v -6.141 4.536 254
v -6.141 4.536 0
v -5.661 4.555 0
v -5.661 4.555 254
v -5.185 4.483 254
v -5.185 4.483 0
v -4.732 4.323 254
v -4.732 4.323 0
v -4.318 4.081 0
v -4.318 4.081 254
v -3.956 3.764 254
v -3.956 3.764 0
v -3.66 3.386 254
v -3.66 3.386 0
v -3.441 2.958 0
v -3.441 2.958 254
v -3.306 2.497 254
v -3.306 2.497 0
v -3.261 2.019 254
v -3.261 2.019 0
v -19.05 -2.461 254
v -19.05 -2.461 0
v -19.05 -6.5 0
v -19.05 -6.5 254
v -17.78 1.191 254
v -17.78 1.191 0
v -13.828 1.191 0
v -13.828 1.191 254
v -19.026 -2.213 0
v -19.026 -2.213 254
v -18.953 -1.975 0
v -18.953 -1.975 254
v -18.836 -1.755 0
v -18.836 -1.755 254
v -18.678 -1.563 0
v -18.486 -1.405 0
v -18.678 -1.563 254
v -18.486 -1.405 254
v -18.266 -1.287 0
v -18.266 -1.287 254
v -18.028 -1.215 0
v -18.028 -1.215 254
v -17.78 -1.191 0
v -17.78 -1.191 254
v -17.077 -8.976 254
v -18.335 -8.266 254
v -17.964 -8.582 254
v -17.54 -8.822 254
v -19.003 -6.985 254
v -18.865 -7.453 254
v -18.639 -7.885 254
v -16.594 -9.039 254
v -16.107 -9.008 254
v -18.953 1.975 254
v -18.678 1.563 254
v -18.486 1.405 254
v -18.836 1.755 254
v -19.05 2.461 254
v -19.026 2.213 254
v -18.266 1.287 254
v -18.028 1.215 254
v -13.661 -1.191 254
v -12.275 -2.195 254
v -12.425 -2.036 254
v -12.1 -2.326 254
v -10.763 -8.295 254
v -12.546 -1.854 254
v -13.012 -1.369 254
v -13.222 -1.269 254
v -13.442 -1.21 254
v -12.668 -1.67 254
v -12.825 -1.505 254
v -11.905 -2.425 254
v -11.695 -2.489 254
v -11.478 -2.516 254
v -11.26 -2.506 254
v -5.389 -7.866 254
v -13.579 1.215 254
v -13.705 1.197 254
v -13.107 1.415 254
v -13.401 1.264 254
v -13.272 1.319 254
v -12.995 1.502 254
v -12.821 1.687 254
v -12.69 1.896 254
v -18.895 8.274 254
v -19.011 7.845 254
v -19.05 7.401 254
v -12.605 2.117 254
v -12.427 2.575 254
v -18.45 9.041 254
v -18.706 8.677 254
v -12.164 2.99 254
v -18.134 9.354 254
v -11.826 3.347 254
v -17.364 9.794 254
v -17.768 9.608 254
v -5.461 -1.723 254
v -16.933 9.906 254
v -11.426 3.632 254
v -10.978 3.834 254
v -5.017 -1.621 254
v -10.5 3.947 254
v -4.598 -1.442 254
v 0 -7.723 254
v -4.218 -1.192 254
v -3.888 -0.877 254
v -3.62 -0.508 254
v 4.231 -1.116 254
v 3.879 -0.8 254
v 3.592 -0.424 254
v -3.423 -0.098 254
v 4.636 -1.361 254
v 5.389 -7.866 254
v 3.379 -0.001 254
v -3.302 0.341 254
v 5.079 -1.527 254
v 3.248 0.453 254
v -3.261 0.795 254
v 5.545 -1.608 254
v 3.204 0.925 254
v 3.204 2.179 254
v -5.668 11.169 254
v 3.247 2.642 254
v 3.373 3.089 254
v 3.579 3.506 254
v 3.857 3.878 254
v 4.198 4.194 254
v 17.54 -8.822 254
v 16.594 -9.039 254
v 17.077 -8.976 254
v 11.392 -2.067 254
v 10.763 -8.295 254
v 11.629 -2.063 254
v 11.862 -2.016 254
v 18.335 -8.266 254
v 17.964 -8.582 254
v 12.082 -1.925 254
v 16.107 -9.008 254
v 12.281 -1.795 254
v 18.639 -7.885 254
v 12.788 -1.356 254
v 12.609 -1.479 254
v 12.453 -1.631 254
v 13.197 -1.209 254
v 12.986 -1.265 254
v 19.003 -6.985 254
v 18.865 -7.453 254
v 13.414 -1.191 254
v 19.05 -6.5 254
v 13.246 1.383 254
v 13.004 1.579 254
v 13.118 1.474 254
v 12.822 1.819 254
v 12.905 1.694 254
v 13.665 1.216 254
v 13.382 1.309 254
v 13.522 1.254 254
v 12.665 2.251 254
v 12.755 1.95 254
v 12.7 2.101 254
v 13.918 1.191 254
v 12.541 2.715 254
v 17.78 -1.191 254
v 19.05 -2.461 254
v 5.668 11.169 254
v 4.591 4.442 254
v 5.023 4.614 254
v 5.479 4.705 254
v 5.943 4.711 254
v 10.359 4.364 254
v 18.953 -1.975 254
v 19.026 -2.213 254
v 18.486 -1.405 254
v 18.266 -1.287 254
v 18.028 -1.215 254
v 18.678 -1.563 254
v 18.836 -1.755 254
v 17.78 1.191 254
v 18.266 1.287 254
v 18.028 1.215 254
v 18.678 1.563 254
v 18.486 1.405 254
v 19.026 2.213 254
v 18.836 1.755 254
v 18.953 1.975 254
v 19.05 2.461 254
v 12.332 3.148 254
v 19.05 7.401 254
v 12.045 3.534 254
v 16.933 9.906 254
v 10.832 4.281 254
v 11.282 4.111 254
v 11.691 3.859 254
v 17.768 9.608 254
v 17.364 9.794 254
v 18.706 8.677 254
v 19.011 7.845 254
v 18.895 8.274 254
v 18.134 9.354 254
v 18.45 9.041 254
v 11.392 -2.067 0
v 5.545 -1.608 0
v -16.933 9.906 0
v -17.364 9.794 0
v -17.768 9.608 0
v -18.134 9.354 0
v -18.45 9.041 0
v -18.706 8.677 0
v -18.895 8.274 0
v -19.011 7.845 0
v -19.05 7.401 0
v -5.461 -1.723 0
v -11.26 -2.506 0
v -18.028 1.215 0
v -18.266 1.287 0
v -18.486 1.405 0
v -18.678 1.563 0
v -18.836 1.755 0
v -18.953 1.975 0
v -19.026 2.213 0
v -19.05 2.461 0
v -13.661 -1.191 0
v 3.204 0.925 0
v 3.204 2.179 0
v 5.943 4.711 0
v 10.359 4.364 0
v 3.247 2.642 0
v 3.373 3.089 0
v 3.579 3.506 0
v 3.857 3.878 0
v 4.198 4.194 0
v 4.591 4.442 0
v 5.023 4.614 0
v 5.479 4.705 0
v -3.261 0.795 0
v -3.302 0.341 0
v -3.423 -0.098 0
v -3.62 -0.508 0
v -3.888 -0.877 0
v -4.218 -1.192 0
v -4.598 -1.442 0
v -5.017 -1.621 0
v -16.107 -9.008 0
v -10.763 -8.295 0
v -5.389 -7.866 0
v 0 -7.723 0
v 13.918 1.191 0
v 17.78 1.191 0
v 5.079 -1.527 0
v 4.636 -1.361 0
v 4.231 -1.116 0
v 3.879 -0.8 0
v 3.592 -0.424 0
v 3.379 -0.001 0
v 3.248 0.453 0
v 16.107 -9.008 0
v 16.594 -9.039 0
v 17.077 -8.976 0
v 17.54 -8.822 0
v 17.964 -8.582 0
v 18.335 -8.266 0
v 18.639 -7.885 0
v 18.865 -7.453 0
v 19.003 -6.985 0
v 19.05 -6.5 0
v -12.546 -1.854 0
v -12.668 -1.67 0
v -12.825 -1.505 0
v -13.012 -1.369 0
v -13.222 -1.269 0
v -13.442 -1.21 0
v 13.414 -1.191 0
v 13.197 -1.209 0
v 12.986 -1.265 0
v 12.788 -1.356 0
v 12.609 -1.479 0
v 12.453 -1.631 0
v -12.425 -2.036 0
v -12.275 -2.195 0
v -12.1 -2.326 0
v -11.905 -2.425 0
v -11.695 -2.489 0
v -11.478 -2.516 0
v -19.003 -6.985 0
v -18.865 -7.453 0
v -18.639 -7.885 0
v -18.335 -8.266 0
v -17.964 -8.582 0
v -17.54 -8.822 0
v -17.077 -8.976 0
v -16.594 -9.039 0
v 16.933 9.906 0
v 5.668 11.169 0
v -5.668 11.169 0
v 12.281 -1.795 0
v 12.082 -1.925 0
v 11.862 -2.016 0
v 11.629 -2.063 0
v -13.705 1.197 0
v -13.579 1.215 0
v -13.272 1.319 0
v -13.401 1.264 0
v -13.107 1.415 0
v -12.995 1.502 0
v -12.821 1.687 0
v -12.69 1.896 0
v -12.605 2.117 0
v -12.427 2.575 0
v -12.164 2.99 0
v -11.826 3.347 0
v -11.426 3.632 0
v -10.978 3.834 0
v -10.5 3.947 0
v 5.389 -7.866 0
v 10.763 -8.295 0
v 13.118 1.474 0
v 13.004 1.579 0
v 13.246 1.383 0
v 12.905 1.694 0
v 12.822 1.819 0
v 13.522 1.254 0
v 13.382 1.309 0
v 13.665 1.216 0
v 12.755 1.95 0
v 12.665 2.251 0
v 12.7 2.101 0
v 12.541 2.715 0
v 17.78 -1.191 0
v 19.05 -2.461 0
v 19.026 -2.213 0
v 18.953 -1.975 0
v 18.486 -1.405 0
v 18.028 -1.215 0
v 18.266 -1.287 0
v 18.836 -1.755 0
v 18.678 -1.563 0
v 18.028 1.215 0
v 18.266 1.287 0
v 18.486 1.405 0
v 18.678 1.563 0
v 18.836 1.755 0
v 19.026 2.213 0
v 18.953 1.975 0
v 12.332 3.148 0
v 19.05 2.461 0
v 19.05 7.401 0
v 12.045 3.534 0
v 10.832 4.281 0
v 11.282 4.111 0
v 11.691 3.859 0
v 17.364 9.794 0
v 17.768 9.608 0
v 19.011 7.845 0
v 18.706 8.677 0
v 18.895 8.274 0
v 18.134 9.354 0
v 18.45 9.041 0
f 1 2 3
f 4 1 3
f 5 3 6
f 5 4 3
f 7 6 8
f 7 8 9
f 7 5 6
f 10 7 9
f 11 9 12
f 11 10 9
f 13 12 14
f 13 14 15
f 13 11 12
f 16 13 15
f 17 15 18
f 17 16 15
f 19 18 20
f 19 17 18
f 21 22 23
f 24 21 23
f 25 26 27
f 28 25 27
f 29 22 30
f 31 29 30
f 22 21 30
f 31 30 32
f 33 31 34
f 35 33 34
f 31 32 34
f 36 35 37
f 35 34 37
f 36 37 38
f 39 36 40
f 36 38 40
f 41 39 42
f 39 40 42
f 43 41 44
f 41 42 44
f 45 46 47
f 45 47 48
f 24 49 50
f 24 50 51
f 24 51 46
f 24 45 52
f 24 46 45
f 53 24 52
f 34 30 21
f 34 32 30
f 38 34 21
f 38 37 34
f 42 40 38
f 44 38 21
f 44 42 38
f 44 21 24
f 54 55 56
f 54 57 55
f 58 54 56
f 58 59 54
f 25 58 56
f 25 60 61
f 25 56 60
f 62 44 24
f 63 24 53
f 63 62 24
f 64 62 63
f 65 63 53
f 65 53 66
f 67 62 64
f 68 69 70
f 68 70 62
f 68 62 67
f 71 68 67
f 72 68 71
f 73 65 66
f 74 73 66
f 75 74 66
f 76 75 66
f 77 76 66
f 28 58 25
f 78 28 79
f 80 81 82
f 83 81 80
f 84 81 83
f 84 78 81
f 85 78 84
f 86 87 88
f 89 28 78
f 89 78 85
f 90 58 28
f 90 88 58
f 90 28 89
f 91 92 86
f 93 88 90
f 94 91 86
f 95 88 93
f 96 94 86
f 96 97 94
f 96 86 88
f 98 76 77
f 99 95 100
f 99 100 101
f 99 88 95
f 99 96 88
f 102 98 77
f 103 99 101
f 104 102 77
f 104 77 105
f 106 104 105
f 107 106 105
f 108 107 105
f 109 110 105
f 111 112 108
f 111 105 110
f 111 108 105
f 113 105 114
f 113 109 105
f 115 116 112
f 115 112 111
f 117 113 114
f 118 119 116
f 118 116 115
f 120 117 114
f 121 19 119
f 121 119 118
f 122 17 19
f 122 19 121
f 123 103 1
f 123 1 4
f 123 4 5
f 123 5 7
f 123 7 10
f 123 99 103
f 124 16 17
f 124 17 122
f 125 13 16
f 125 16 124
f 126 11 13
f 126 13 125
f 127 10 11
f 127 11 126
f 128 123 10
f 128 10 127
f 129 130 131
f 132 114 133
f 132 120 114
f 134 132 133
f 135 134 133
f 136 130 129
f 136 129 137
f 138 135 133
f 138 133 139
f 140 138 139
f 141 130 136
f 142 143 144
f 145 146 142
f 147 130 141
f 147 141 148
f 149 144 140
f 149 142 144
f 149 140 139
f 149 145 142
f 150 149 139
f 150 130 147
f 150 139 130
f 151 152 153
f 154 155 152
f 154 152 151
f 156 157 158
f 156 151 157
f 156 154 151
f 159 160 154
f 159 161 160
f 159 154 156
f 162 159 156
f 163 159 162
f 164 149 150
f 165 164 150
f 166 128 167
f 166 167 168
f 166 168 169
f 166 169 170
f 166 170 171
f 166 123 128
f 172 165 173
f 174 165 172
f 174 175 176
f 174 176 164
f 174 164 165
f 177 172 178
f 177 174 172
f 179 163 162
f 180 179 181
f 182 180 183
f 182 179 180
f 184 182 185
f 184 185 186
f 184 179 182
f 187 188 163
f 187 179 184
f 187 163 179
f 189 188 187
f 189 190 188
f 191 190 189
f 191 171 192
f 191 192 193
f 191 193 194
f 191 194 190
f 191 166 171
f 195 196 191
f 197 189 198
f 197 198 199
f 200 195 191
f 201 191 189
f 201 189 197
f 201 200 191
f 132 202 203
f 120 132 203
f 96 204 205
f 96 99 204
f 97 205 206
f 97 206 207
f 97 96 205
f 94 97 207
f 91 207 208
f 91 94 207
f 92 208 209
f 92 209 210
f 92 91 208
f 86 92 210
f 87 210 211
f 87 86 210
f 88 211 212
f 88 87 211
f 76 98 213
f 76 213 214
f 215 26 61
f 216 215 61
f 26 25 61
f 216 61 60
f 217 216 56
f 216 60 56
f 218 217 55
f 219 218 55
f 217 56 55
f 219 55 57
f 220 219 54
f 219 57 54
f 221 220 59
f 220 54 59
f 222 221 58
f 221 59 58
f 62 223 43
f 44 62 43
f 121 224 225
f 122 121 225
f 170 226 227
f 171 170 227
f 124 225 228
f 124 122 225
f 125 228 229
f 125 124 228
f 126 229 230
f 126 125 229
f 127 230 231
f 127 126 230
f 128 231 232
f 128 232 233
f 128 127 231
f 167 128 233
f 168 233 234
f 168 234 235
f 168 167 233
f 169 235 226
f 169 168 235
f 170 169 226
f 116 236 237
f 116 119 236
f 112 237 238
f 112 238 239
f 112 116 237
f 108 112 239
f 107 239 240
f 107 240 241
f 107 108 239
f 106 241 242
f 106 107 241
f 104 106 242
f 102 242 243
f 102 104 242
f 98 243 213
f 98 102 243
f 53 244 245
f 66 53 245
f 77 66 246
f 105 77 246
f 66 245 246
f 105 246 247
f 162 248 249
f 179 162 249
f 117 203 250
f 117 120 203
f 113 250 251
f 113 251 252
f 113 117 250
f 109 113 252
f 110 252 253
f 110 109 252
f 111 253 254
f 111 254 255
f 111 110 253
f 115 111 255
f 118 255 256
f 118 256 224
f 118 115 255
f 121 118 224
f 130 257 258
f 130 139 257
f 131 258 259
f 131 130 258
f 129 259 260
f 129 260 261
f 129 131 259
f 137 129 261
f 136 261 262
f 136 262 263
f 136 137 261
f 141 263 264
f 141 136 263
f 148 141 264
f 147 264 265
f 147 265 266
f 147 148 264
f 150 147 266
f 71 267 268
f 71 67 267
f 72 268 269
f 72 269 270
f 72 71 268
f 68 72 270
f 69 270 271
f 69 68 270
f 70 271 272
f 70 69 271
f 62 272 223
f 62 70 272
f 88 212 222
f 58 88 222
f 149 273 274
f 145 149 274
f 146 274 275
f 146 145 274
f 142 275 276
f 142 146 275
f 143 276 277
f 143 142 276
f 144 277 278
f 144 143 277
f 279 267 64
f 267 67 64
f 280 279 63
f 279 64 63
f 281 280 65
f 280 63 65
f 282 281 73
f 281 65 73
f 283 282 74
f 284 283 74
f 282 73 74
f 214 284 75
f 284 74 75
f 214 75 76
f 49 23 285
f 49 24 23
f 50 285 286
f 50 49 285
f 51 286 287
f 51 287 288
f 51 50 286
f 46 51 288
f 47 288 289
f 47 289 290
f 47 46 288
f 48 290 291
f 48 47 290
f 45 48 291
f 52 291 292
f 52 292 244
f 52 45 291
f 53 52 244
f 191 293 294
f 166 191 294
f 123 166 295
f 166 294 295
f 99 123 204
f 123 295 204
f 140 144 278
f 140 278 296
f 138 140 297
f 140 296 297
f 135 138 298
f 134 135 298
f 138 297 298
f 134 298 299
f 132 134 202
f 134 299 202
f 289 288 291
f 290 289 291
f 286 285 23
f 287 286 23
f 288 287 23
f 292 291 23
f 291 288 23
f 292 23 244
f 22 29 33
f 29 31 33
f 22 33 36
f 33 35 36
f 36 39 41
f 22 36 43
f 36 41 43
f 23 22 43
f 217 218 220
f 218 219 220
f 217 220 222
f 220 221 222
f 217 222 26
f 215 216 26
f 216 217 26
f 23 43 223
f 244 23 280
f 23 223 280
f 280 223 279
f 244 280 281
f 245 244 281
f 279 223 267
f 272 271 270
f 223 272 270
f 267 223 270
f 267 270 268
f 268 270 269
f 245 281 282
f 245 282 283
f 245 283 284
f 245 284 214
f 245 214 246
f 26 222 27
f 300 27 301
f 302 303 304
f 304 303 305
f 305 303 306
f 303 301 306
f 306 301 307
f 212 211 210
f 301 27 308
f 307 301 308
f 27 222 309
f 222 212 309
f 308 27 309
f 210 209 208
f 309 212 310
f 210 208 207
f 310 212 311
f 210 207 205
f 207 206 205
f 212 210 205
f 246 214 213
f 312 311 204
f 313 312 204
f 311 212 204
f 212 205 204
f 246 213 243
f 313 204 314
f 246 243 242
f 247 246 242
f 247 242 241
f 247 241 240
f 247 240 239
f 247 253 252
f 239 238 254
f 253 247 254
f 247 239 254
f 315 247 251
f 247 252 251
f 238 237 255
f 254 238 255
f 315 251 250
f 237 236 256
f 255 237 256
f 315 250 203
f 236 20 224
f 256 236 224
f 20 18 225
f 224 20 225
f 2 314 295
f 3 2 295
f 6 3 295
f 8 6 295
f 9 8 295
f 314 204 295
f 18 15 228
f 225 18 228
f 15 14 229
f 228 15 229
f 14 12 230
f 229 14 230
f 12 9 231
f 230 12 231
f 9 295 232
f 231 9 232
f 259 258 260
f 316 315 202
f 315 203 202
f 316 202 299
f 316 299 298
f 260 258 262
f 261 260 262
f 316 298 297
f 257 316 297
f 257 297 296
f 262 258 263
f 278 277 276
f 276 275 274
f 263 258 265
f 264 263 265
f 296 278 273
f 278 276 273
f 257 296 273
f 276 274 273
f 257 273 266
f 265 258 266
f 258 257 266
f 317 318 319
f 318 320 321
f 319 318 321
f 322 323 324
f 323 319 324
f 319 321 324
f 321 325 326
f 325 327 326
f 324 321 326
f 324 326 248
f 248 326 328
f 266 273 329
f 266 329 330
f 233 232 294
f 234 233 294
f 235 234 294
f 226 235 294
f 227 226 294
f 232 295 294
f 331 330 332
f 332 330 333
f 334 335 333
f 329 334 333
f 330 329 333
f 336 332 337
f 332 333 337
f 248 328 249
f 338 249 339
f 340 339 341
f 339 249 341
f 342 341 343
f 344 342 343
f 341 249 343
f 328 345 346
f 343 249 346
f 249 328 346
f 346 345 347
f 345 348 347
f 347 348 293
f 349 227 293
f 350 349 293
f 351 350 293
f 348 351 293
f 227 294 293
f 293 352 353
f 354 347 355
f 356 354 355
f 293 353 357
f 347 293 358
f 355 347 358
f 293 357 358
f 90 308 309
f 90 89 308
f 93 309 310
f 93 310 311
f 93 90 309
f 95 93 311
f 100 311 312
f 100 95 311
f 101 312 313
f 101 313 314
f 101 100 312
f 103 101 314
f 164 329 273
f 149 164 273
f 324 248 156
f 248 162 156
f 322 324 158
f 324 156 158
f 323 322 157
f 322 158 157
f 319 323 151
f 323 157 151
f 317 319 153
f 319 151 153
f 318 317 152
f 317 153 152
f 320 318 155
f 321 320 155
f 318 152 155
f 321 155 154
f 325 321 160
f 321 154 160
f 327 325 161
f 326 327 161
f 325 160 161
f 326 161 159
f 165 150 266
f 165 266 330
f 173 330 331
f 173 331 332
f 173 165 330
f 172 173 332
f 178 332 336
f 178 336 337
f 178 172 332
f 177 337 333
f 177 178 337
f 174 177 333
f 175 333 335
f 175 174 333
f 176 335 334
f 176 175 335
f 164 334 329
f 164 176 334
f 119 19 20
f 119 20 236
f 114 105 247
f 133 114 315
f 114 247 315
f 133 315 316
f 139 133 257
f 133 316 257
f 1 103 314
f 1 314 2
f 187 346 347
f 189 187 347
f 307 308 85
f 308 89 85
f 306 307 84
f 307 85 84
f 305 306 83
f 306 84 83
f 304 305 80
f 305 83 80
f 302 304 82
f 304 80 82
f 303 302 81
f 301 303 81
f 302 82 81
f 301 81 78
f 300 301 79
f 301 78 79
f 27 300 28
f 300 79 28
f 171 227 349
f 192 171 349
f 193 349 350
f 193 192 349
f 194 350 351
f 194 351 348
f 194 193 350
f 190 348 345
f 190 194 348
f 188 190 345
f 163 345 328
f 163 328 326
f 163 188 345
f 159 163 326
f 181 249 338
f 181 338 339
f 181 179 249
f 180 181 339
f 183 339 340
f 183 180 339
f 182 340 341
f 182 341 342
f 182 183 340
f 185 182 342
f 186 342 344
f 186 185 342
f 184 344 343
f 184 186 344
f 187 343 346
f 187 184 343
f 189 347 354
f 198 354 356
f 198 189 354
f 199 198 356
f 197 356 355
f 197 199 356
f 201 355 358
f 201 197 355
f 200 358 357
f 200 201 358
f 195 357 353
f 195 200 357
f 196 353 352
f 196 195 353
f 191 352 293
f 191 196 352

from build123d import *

# Parameters (mm, degrees)
F1_DEPTH    = 254
F2_R        = 2.54
F3_R        = 1.27
F4_T1_DEPTH = 254
F5_R        = 1.27
F6_R        = 1.27
F7_R        = 1.27


# Not quite as in the source:
# - a fillet or chamfer that OpenCascade refuses, or shapes differently, is made with other operations: its cross-section is extruded or revolved along the edge and cut away or added


with BuildPart() as f1:
    # F0 (on Top) → F1 (new body)
    with BuildSketch(Plane.XY):
        with BuildLine():
            ThreePointArc((0, -7.7230836489), (9.5675153846, -8.1745658676), (19.05, -9.525))
            Line((19.05, -9.525), (19.05, -1.190625))
            Line((19.05, -1.190625), (12.7, -1.190625))
            Line((12.7, -1.190625), (12.7, -2.1699586974))
            Line((12.7, -2.1699586974), (3.2042846004, -1.4236249591))
            Line((3.2042846004, -1.4236249591), (3.2042846004, 1.7513750409))
            Line((3.2042846004, 1.7513750409), (3.2042846004, 4.9263750409))
            Line((3.2042846004, 4.9263750409), (12.7, 4.1800413026))
            Line((12.7, 4.1800413026), (12.7, 1.190625))
            Line((12.7, 1.190625), (19.05, 1.190625))
            Line((19.05, 1.190625), (19.05, 9.525))
            ThreePointArc((19.05, 9.525), (0, 11.3269163511), (-19.05, 9.525))
            Line((-19.05, 9.525), (-19.05, 1.190625))
            Line((-19.05, 1.190625), (-12.7, 1.190625))
            Line((-12.7, 1.190625), (-12.7, 3.6498726836))
            Line((-12.7, 3.6498726836), (-3.2606808159, 4.9245798427))
            Line((-3.2606808159, 4.9245798427), (-3.2606808159, 1.7495798427))
            Line((-3.2606808159, 1.7495798427), (-3.2606808159, -1.4254201573))
            Line((-3.2606808159, -1.4254201573), (-12.7, -2.7001273164))
            Line((-12.7, -2.7001273164), (-12.7, -1.190625))
            Line((-12.7, -1.190625), (-19.05, -1.190625))
            Line((-19.05, -1.190625), (-19.05, -9.525))
            ThreePointArc((-19.05, -9.525), (-9.5675153846, -8.1745658676), (0, -7.7230836489))
        make_face()
    extrude(amount=F1_DEPTH)

    # F2
    f2_edges = [f1.edges().sort_by_distance(p)[0] for p in [
        (19.05, -9.525, 127),
        (19.05, 9.525, 127),
        (-19.05, -9.525, 127),
        (-19.05, 9.525, 127),
        (-12.7, 3.649873, 127),
        (3.204285, 4.926375, 127),
        (3.204285, -1.423625, 127),
        (12.7, 4.180041, 127),
        (-3.260681, 4.92458, 127),
        (-3.260681, -1.42542, 127),
    ]]
    fillet(f2_edges, radius=F2_R)

    # F3
    f3_edges = [f1.edges().sort_by_distance(p)[0] for p in [
        (19.05, -1.190625, 127),
        (19.05, 1.190625, 127),
        (-19.05, -1.190625, 127),
        (-19.05, 1.190625, 127),
    ]]
    fillet(f3_edges, radius=F3_R)

    # F4: fillet of radius 1.27 on 1 edges, made by hand

    # F4_s2 → F4_t1 (join)
    with BuildSketch(Plane.XY):
        with BuildLine():
            ThreePointArc((12.7, -1.190625), (12.1981114255, -1.8561294958), (11.3917205019, -2.0671319921))
            Line((11.3917205019, -2.0671319921), (12.7, -2.1699586974))
            Line((12.7, -2.1699586974), (12.7, -1.190625))
        make_face()
    extrude(amount=F4_T1_DEPTH)

    # F5
    f5_edges = [f1.edges().sort_by_distance(p)[0] for p in [
        (-12.7, -2.700127, 127),
    ]]
    fillet(f5_edges, radius=F5_R)

    # F6
    f6_edges = [f1.edges().sort_by_distance(p)[0] for p in [
        (-12.7, 1.190625, 127),
        (-12.7, -1.190625, 127),
        (12.7, 1.190625, 127),
    ]]
    fillet(f6_edges, radius=F6_R)

    # F7
    f7_edges = [f1.edges().sort_by_distance(p)[0] for p in [
        (12.7, -1.190625, 127),
    ]]
    fillet(f7_edges, radius=F7_R)


solid = f1.part
